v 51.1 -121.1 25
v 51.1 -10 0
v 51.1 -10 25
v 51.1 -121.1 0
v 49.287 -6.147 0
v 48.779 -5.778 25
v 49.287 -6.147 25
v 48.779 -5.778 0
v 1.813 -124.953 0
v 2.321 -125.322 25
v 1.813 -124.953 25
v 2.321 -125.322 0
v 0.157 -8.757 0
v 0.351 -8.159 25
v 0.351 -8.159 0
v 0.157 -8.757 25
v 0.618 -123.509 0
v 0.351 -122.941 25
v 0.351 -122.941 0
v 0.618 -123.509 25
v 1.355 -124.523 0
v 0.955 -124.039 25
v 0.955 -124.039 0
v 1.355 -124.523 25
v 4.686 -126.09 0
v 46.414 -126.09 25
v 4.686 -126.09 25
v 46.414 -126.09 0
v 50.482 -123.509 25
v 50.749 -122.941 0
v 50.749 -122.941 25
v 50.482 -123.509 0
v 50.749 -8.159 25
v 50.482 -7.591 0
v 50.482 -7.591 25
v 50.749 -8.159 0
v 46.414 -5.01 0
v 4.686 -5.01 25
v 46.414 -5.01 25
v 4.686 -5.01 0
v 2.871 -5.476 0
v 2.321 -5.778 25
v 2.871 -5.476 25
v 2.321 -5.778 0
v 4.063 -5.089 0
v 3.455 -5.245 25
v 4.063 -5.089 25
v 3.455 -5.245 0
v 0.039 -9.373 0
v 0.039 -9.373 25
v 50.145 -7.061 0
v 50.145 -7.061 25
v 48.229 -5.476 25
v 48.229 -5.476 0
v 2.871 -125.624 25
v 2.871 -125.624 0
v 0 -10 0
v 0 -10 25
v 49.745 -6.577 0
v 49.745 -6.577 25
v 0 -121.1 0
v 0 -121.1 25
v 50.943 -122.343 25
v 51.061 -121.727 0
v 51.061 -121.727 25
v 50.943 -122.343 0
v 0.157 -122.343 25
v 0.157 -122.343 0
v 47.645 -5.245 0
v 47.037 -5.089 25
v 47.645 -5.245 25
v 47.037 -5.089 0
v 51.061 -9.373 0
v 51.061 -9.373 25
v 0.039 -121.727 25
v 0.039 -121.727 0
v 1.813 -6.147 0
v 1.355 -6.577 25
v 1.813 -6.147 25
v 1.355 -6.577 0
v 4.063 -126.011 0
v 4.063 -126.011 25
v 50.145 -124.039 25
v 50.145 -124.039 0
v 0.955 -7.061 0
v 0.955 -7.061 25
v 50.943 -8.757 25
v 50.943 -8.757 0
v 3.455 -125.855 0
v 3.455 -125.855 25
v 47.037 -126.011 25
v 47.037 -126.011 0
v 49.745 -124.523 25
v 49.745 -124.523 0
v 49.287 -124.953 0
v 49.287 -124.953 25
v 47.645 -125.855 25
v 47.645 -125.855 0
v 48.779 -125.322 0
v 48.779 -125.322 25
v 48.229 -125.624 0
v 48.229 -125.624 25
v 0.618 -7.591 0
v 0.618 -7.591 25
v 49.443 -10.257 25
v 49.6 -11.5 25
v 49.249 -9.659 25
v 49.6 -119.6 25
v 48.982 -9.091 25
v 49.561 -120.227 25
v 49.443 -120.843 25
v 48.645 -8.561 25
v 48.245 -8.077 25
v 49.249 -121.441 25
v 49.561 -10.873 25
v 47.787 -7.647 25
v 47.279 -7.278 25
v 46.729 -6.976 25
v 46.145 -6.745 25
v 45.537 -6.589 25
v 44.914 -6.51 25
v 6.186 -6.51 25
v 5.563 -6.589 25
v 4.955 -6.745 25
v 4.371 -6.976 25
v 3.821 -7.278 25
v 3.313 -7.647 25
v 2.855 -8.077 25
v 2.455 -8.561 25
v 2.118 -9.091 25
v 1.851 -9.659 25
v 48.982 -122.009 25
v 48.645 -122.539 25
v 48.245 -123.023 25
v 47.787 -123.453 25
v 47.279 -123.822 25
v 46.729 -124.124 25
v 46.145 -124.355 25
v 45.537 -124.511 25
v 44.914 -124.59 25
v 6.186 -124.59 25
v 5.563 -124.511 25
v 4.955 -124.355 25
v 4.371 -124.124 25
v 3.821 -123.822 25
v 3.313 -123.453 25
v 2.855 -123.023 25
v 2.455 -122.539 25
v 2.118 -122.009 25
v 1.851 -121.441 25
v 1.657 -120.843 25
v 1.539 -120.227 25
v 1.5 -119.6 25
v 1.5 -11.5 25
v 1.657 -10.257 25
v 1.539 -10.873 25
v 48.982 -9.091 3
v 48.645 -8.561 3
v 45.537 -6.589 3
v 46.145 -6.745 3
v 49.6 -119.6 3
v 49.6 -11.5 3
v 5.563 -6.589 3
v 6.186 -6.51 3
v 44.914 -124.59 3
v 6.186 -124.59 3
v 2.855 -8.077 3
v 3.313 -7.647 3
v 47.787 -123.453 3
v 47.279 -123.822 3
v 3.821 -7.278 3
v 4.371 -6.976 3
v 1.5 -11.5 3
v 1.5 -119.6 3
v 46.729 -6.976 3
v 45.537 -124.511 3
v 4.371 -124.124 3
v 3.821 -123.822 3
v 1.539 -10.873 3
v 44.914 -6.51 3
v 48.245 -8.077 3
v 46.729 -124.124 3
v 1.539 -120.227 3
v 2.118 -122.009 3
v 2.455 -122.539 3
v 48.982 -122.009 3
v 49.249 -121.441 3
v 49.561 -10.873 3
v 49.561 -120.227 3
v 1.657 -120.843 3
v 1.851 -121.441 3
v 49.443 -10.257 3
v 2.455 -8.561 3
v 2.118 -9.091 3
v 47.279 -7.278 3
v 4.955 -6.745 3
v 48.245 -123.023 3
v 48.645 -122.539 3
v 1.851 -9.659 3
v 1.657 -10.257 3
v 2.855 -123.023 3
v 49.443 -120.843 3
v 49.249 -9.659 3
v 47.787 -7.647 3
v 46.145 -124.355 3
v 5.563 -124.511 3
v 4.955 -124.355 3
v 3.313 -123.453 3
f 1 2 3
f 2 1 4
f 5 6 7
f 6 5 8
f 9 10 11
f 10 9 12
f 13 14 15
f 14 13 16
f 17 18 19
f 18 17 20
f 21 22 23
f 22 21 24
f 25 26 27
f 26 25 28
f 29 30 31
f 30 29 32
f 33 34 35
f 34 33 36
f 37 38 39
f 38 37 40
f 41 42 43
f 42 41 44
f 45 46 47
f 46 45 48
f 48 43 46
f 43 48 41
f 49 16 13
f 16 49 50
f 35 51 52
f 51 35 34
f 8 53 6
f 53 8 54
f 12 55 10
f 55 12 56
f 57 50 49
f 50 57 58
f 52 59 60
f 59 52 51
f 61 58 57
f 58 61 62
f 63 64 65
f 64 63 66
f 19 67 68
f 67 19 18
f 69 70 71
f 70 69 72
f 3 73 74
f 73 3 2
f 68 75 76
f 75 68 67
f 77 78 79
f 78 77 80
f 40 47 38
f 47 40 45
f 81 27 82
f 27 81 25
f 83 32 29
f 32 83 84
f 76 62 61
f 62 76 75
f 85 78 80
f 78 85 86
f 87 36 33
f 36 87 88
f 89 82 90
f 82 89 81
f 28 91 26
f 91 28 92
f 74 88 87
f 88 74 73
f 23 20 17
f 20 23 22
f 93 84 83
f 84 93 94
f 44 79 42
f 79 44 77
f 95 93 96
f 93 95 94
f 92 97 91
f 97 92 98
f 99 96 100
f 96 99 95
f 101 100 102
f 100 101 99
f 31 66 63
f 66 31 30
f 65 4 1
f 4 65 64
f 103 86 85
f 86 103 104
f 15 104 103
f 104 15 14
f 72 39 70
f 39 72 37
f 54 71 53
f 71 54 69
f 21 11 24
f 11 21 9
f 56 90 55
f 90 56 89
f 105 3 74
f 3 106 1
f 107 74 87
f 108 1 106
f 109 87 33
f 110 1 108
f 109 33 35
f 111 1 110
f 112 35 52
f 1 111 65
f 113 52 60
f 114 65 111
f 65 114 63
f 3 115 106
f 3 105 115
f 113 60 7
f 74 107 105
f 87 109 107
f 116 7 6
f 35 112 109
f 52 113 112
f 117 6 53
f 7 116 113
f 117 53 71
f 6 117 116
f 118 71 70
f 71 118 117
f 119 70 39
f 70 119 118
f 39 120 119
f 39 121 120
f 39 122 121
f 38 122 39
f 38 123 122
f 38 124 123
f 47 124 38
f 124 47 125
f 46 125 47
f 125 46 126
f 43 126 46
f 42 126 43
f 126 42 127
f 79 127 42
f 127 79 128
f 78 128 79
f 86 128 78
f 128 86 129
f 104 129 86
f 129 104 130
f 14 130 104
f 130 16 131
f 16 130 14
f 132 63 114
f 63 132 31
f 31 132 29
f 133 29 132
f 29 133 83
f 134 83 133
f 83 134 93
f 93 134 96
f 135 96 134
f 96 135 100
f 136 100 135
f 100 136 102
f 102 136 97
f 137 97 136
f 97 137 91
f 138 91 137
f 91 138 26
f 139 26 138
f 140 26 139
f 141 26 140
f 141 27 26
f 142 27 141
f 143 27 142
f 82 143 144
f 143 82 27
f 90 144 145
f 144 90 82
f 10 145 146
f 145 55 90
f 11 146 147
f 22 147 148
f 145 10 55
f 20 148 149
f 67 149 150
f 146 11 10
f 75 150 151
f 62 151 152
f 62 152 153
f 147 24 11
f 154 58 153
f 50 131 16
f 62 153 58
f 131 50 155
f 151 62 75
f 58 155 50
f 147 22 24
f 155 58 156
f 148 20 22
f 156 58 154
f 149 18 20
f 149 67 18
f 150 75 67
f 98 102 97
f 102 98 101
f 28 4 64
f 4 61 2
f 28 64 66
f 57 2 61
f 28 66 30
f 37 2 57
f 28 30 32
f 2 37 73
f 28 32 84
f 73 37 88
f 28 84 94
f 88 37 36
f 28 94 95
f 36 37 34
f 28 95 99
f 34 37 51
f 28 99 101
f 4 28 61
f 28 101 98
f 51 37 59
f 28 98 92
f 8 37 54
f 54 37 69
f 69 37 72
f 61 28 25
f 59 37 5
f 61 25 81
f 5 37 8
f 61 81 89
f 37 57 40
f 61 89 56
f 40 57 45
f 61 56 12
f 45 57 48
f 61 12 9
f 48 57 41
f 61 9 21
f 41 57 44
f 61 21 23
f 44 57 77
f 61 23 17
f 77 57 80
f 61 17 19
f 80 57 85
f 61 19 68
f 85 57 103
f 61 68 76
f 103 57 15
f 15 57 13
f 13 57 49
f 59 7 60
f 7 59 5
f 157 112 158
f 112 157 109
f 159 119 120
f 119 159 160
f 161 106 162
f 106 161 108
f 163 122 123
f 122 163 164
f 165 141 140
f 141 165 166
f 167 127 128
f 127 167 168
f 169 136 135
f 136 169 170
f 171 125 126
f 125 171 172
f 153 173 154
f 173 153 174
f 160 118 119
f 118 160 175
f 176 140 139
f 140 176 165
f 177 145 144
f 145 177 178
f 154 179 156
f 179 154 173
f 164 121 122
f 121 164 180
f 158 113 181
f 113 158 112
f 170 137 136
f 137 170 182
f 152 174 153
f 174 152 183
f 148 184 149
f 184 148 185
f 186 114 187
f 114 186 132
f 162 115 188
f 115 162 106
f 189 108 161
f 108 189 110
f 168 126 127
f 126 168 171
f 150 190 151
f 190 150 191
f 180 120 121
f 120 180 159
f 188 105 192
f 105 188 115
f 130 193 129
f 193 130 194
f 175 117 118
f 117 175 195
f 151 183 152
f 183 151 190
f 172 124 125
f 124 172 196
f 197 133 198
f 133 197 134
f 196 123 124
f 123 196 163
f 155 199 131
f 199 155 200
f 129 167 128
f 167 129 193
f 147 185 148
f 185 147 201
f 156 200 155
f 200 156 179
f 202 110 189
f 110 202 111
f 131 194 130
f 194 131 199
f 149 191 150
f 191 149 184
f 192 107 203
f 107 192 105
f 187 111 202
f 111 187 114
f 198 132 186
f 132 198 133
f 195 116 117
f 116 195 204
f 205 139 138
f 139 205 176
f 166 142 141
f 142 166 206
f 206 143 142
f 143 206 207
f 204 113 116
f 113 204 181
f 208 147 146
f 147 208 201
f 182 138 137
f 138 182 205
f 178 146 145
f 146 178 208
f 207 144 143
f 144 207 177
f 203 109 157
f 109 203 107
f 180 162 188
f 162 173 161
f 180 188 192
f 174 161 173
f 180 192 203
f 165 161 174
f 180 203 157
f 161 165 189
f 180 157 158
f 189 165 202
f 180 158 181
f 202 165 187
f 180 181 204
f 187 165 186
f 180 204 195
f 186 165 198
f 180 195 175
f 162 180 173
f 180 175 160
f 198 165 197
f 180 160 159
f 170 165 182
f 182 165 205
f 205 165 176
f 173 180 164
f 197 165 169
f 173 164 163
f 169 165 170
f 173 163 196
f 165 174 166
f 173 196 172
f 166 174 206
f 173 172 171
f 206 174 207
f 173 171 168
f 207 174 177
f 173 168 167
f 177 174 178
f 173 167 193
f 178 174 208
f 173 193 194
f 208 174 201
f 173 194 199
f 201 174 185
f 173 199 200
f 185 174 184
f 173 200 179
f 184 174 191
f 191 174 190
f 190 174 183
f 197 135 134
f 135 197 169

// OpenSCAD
/* [Configurations] */
Object_Height = 90;
Object_Width = 45;
Object_Depth = 115;
Wall_Thickness = 3;// 5mm is good enough
Cover_Height = 25;

/* [hidden] */
$fn = 50;
Tolerance = 0.1;
Cover_Spacing = 0.5;
Rounded_Corner = 5;


translate([0 ,-5 ,Cover_Height]) rotate([180,0,0])  tampa(0);

module caixa(){
    difference(){
    roundedcube(Object_Width + Tolerance + (Wall_Thickness * 2), Object_Depth + Tolerance + (Wall_Thickness * 2), Object_Height + Tolerance + Wall_Thickness, Rounded_Corner,Rounded_Corner,Rounded_Corner,Rounded_Corner);
    translate([Wall_Thickness, Wall_Thickness, Wall_Thickness]) cube([Object_Width + Tolerance, Object_Depth + Tolerance, Object_Height + Tolerance + 1]);
    // Recorte da tampa
    translate([0,-0,(Object_Height + 1) - Cover_Height + (Wall_Thickness * 2)]) tampa(Cover_Spacing);    
    }
    
}

module simbolo(rotation){
    union()
	{
		rotate([90,0,rotation]) resize([larguraLogo,alturaLogo,profundidadeLogo]) import("logo.stl");
	}
}

module tampa(folga){
    difference(){
    translate([-folga/2,-folga/2,0]) roundedcube(Object_Width + Tolerance + (Wall_Thickness * 2) + folga, Object_Depth + Tolerance + (Wall_Thickness * 2) + folga, Cover_Height, Rounded_Corner,Rounded_Corner,Rounded_Corner,Rounded_Corner);
    translate([(Wall_Thickness + folga)/2, (Wall_Thickness + folga) /2, -Wall_Thickness]) roundedcube(Object_Width + Tolerance + Wall_Thickness - folga, Object_Depth + Tolerance +Wall_Thickness - folga, Cover_Height , Rounded_Corner, Rounded_Corner, Rounded_Corner, Rounded_Corner);
    }
}

module cartas(){
#cube([Object_Width, Object_Depth, Object_Height]);
}

module roundedcube(xdim ,ydim ,zdim,rdim1, rdim2, rdim3, rdim4){
    hull(){
        translate([rdim1,rdim1,0]) cylinder(r=rdim1, h=zdim);
        translate([xdim-rdim2,rdim2,0]) cylinder(r=rdim2, h=zdim);

        translate([rdim3,ydim-rdim3,0]) cylinder(r=rdim3, h=zdim);
        translate([xdim-rdim4,ydim-rdim4,0]) cylinder(r=rdim4, h=zdim);
    }
}
